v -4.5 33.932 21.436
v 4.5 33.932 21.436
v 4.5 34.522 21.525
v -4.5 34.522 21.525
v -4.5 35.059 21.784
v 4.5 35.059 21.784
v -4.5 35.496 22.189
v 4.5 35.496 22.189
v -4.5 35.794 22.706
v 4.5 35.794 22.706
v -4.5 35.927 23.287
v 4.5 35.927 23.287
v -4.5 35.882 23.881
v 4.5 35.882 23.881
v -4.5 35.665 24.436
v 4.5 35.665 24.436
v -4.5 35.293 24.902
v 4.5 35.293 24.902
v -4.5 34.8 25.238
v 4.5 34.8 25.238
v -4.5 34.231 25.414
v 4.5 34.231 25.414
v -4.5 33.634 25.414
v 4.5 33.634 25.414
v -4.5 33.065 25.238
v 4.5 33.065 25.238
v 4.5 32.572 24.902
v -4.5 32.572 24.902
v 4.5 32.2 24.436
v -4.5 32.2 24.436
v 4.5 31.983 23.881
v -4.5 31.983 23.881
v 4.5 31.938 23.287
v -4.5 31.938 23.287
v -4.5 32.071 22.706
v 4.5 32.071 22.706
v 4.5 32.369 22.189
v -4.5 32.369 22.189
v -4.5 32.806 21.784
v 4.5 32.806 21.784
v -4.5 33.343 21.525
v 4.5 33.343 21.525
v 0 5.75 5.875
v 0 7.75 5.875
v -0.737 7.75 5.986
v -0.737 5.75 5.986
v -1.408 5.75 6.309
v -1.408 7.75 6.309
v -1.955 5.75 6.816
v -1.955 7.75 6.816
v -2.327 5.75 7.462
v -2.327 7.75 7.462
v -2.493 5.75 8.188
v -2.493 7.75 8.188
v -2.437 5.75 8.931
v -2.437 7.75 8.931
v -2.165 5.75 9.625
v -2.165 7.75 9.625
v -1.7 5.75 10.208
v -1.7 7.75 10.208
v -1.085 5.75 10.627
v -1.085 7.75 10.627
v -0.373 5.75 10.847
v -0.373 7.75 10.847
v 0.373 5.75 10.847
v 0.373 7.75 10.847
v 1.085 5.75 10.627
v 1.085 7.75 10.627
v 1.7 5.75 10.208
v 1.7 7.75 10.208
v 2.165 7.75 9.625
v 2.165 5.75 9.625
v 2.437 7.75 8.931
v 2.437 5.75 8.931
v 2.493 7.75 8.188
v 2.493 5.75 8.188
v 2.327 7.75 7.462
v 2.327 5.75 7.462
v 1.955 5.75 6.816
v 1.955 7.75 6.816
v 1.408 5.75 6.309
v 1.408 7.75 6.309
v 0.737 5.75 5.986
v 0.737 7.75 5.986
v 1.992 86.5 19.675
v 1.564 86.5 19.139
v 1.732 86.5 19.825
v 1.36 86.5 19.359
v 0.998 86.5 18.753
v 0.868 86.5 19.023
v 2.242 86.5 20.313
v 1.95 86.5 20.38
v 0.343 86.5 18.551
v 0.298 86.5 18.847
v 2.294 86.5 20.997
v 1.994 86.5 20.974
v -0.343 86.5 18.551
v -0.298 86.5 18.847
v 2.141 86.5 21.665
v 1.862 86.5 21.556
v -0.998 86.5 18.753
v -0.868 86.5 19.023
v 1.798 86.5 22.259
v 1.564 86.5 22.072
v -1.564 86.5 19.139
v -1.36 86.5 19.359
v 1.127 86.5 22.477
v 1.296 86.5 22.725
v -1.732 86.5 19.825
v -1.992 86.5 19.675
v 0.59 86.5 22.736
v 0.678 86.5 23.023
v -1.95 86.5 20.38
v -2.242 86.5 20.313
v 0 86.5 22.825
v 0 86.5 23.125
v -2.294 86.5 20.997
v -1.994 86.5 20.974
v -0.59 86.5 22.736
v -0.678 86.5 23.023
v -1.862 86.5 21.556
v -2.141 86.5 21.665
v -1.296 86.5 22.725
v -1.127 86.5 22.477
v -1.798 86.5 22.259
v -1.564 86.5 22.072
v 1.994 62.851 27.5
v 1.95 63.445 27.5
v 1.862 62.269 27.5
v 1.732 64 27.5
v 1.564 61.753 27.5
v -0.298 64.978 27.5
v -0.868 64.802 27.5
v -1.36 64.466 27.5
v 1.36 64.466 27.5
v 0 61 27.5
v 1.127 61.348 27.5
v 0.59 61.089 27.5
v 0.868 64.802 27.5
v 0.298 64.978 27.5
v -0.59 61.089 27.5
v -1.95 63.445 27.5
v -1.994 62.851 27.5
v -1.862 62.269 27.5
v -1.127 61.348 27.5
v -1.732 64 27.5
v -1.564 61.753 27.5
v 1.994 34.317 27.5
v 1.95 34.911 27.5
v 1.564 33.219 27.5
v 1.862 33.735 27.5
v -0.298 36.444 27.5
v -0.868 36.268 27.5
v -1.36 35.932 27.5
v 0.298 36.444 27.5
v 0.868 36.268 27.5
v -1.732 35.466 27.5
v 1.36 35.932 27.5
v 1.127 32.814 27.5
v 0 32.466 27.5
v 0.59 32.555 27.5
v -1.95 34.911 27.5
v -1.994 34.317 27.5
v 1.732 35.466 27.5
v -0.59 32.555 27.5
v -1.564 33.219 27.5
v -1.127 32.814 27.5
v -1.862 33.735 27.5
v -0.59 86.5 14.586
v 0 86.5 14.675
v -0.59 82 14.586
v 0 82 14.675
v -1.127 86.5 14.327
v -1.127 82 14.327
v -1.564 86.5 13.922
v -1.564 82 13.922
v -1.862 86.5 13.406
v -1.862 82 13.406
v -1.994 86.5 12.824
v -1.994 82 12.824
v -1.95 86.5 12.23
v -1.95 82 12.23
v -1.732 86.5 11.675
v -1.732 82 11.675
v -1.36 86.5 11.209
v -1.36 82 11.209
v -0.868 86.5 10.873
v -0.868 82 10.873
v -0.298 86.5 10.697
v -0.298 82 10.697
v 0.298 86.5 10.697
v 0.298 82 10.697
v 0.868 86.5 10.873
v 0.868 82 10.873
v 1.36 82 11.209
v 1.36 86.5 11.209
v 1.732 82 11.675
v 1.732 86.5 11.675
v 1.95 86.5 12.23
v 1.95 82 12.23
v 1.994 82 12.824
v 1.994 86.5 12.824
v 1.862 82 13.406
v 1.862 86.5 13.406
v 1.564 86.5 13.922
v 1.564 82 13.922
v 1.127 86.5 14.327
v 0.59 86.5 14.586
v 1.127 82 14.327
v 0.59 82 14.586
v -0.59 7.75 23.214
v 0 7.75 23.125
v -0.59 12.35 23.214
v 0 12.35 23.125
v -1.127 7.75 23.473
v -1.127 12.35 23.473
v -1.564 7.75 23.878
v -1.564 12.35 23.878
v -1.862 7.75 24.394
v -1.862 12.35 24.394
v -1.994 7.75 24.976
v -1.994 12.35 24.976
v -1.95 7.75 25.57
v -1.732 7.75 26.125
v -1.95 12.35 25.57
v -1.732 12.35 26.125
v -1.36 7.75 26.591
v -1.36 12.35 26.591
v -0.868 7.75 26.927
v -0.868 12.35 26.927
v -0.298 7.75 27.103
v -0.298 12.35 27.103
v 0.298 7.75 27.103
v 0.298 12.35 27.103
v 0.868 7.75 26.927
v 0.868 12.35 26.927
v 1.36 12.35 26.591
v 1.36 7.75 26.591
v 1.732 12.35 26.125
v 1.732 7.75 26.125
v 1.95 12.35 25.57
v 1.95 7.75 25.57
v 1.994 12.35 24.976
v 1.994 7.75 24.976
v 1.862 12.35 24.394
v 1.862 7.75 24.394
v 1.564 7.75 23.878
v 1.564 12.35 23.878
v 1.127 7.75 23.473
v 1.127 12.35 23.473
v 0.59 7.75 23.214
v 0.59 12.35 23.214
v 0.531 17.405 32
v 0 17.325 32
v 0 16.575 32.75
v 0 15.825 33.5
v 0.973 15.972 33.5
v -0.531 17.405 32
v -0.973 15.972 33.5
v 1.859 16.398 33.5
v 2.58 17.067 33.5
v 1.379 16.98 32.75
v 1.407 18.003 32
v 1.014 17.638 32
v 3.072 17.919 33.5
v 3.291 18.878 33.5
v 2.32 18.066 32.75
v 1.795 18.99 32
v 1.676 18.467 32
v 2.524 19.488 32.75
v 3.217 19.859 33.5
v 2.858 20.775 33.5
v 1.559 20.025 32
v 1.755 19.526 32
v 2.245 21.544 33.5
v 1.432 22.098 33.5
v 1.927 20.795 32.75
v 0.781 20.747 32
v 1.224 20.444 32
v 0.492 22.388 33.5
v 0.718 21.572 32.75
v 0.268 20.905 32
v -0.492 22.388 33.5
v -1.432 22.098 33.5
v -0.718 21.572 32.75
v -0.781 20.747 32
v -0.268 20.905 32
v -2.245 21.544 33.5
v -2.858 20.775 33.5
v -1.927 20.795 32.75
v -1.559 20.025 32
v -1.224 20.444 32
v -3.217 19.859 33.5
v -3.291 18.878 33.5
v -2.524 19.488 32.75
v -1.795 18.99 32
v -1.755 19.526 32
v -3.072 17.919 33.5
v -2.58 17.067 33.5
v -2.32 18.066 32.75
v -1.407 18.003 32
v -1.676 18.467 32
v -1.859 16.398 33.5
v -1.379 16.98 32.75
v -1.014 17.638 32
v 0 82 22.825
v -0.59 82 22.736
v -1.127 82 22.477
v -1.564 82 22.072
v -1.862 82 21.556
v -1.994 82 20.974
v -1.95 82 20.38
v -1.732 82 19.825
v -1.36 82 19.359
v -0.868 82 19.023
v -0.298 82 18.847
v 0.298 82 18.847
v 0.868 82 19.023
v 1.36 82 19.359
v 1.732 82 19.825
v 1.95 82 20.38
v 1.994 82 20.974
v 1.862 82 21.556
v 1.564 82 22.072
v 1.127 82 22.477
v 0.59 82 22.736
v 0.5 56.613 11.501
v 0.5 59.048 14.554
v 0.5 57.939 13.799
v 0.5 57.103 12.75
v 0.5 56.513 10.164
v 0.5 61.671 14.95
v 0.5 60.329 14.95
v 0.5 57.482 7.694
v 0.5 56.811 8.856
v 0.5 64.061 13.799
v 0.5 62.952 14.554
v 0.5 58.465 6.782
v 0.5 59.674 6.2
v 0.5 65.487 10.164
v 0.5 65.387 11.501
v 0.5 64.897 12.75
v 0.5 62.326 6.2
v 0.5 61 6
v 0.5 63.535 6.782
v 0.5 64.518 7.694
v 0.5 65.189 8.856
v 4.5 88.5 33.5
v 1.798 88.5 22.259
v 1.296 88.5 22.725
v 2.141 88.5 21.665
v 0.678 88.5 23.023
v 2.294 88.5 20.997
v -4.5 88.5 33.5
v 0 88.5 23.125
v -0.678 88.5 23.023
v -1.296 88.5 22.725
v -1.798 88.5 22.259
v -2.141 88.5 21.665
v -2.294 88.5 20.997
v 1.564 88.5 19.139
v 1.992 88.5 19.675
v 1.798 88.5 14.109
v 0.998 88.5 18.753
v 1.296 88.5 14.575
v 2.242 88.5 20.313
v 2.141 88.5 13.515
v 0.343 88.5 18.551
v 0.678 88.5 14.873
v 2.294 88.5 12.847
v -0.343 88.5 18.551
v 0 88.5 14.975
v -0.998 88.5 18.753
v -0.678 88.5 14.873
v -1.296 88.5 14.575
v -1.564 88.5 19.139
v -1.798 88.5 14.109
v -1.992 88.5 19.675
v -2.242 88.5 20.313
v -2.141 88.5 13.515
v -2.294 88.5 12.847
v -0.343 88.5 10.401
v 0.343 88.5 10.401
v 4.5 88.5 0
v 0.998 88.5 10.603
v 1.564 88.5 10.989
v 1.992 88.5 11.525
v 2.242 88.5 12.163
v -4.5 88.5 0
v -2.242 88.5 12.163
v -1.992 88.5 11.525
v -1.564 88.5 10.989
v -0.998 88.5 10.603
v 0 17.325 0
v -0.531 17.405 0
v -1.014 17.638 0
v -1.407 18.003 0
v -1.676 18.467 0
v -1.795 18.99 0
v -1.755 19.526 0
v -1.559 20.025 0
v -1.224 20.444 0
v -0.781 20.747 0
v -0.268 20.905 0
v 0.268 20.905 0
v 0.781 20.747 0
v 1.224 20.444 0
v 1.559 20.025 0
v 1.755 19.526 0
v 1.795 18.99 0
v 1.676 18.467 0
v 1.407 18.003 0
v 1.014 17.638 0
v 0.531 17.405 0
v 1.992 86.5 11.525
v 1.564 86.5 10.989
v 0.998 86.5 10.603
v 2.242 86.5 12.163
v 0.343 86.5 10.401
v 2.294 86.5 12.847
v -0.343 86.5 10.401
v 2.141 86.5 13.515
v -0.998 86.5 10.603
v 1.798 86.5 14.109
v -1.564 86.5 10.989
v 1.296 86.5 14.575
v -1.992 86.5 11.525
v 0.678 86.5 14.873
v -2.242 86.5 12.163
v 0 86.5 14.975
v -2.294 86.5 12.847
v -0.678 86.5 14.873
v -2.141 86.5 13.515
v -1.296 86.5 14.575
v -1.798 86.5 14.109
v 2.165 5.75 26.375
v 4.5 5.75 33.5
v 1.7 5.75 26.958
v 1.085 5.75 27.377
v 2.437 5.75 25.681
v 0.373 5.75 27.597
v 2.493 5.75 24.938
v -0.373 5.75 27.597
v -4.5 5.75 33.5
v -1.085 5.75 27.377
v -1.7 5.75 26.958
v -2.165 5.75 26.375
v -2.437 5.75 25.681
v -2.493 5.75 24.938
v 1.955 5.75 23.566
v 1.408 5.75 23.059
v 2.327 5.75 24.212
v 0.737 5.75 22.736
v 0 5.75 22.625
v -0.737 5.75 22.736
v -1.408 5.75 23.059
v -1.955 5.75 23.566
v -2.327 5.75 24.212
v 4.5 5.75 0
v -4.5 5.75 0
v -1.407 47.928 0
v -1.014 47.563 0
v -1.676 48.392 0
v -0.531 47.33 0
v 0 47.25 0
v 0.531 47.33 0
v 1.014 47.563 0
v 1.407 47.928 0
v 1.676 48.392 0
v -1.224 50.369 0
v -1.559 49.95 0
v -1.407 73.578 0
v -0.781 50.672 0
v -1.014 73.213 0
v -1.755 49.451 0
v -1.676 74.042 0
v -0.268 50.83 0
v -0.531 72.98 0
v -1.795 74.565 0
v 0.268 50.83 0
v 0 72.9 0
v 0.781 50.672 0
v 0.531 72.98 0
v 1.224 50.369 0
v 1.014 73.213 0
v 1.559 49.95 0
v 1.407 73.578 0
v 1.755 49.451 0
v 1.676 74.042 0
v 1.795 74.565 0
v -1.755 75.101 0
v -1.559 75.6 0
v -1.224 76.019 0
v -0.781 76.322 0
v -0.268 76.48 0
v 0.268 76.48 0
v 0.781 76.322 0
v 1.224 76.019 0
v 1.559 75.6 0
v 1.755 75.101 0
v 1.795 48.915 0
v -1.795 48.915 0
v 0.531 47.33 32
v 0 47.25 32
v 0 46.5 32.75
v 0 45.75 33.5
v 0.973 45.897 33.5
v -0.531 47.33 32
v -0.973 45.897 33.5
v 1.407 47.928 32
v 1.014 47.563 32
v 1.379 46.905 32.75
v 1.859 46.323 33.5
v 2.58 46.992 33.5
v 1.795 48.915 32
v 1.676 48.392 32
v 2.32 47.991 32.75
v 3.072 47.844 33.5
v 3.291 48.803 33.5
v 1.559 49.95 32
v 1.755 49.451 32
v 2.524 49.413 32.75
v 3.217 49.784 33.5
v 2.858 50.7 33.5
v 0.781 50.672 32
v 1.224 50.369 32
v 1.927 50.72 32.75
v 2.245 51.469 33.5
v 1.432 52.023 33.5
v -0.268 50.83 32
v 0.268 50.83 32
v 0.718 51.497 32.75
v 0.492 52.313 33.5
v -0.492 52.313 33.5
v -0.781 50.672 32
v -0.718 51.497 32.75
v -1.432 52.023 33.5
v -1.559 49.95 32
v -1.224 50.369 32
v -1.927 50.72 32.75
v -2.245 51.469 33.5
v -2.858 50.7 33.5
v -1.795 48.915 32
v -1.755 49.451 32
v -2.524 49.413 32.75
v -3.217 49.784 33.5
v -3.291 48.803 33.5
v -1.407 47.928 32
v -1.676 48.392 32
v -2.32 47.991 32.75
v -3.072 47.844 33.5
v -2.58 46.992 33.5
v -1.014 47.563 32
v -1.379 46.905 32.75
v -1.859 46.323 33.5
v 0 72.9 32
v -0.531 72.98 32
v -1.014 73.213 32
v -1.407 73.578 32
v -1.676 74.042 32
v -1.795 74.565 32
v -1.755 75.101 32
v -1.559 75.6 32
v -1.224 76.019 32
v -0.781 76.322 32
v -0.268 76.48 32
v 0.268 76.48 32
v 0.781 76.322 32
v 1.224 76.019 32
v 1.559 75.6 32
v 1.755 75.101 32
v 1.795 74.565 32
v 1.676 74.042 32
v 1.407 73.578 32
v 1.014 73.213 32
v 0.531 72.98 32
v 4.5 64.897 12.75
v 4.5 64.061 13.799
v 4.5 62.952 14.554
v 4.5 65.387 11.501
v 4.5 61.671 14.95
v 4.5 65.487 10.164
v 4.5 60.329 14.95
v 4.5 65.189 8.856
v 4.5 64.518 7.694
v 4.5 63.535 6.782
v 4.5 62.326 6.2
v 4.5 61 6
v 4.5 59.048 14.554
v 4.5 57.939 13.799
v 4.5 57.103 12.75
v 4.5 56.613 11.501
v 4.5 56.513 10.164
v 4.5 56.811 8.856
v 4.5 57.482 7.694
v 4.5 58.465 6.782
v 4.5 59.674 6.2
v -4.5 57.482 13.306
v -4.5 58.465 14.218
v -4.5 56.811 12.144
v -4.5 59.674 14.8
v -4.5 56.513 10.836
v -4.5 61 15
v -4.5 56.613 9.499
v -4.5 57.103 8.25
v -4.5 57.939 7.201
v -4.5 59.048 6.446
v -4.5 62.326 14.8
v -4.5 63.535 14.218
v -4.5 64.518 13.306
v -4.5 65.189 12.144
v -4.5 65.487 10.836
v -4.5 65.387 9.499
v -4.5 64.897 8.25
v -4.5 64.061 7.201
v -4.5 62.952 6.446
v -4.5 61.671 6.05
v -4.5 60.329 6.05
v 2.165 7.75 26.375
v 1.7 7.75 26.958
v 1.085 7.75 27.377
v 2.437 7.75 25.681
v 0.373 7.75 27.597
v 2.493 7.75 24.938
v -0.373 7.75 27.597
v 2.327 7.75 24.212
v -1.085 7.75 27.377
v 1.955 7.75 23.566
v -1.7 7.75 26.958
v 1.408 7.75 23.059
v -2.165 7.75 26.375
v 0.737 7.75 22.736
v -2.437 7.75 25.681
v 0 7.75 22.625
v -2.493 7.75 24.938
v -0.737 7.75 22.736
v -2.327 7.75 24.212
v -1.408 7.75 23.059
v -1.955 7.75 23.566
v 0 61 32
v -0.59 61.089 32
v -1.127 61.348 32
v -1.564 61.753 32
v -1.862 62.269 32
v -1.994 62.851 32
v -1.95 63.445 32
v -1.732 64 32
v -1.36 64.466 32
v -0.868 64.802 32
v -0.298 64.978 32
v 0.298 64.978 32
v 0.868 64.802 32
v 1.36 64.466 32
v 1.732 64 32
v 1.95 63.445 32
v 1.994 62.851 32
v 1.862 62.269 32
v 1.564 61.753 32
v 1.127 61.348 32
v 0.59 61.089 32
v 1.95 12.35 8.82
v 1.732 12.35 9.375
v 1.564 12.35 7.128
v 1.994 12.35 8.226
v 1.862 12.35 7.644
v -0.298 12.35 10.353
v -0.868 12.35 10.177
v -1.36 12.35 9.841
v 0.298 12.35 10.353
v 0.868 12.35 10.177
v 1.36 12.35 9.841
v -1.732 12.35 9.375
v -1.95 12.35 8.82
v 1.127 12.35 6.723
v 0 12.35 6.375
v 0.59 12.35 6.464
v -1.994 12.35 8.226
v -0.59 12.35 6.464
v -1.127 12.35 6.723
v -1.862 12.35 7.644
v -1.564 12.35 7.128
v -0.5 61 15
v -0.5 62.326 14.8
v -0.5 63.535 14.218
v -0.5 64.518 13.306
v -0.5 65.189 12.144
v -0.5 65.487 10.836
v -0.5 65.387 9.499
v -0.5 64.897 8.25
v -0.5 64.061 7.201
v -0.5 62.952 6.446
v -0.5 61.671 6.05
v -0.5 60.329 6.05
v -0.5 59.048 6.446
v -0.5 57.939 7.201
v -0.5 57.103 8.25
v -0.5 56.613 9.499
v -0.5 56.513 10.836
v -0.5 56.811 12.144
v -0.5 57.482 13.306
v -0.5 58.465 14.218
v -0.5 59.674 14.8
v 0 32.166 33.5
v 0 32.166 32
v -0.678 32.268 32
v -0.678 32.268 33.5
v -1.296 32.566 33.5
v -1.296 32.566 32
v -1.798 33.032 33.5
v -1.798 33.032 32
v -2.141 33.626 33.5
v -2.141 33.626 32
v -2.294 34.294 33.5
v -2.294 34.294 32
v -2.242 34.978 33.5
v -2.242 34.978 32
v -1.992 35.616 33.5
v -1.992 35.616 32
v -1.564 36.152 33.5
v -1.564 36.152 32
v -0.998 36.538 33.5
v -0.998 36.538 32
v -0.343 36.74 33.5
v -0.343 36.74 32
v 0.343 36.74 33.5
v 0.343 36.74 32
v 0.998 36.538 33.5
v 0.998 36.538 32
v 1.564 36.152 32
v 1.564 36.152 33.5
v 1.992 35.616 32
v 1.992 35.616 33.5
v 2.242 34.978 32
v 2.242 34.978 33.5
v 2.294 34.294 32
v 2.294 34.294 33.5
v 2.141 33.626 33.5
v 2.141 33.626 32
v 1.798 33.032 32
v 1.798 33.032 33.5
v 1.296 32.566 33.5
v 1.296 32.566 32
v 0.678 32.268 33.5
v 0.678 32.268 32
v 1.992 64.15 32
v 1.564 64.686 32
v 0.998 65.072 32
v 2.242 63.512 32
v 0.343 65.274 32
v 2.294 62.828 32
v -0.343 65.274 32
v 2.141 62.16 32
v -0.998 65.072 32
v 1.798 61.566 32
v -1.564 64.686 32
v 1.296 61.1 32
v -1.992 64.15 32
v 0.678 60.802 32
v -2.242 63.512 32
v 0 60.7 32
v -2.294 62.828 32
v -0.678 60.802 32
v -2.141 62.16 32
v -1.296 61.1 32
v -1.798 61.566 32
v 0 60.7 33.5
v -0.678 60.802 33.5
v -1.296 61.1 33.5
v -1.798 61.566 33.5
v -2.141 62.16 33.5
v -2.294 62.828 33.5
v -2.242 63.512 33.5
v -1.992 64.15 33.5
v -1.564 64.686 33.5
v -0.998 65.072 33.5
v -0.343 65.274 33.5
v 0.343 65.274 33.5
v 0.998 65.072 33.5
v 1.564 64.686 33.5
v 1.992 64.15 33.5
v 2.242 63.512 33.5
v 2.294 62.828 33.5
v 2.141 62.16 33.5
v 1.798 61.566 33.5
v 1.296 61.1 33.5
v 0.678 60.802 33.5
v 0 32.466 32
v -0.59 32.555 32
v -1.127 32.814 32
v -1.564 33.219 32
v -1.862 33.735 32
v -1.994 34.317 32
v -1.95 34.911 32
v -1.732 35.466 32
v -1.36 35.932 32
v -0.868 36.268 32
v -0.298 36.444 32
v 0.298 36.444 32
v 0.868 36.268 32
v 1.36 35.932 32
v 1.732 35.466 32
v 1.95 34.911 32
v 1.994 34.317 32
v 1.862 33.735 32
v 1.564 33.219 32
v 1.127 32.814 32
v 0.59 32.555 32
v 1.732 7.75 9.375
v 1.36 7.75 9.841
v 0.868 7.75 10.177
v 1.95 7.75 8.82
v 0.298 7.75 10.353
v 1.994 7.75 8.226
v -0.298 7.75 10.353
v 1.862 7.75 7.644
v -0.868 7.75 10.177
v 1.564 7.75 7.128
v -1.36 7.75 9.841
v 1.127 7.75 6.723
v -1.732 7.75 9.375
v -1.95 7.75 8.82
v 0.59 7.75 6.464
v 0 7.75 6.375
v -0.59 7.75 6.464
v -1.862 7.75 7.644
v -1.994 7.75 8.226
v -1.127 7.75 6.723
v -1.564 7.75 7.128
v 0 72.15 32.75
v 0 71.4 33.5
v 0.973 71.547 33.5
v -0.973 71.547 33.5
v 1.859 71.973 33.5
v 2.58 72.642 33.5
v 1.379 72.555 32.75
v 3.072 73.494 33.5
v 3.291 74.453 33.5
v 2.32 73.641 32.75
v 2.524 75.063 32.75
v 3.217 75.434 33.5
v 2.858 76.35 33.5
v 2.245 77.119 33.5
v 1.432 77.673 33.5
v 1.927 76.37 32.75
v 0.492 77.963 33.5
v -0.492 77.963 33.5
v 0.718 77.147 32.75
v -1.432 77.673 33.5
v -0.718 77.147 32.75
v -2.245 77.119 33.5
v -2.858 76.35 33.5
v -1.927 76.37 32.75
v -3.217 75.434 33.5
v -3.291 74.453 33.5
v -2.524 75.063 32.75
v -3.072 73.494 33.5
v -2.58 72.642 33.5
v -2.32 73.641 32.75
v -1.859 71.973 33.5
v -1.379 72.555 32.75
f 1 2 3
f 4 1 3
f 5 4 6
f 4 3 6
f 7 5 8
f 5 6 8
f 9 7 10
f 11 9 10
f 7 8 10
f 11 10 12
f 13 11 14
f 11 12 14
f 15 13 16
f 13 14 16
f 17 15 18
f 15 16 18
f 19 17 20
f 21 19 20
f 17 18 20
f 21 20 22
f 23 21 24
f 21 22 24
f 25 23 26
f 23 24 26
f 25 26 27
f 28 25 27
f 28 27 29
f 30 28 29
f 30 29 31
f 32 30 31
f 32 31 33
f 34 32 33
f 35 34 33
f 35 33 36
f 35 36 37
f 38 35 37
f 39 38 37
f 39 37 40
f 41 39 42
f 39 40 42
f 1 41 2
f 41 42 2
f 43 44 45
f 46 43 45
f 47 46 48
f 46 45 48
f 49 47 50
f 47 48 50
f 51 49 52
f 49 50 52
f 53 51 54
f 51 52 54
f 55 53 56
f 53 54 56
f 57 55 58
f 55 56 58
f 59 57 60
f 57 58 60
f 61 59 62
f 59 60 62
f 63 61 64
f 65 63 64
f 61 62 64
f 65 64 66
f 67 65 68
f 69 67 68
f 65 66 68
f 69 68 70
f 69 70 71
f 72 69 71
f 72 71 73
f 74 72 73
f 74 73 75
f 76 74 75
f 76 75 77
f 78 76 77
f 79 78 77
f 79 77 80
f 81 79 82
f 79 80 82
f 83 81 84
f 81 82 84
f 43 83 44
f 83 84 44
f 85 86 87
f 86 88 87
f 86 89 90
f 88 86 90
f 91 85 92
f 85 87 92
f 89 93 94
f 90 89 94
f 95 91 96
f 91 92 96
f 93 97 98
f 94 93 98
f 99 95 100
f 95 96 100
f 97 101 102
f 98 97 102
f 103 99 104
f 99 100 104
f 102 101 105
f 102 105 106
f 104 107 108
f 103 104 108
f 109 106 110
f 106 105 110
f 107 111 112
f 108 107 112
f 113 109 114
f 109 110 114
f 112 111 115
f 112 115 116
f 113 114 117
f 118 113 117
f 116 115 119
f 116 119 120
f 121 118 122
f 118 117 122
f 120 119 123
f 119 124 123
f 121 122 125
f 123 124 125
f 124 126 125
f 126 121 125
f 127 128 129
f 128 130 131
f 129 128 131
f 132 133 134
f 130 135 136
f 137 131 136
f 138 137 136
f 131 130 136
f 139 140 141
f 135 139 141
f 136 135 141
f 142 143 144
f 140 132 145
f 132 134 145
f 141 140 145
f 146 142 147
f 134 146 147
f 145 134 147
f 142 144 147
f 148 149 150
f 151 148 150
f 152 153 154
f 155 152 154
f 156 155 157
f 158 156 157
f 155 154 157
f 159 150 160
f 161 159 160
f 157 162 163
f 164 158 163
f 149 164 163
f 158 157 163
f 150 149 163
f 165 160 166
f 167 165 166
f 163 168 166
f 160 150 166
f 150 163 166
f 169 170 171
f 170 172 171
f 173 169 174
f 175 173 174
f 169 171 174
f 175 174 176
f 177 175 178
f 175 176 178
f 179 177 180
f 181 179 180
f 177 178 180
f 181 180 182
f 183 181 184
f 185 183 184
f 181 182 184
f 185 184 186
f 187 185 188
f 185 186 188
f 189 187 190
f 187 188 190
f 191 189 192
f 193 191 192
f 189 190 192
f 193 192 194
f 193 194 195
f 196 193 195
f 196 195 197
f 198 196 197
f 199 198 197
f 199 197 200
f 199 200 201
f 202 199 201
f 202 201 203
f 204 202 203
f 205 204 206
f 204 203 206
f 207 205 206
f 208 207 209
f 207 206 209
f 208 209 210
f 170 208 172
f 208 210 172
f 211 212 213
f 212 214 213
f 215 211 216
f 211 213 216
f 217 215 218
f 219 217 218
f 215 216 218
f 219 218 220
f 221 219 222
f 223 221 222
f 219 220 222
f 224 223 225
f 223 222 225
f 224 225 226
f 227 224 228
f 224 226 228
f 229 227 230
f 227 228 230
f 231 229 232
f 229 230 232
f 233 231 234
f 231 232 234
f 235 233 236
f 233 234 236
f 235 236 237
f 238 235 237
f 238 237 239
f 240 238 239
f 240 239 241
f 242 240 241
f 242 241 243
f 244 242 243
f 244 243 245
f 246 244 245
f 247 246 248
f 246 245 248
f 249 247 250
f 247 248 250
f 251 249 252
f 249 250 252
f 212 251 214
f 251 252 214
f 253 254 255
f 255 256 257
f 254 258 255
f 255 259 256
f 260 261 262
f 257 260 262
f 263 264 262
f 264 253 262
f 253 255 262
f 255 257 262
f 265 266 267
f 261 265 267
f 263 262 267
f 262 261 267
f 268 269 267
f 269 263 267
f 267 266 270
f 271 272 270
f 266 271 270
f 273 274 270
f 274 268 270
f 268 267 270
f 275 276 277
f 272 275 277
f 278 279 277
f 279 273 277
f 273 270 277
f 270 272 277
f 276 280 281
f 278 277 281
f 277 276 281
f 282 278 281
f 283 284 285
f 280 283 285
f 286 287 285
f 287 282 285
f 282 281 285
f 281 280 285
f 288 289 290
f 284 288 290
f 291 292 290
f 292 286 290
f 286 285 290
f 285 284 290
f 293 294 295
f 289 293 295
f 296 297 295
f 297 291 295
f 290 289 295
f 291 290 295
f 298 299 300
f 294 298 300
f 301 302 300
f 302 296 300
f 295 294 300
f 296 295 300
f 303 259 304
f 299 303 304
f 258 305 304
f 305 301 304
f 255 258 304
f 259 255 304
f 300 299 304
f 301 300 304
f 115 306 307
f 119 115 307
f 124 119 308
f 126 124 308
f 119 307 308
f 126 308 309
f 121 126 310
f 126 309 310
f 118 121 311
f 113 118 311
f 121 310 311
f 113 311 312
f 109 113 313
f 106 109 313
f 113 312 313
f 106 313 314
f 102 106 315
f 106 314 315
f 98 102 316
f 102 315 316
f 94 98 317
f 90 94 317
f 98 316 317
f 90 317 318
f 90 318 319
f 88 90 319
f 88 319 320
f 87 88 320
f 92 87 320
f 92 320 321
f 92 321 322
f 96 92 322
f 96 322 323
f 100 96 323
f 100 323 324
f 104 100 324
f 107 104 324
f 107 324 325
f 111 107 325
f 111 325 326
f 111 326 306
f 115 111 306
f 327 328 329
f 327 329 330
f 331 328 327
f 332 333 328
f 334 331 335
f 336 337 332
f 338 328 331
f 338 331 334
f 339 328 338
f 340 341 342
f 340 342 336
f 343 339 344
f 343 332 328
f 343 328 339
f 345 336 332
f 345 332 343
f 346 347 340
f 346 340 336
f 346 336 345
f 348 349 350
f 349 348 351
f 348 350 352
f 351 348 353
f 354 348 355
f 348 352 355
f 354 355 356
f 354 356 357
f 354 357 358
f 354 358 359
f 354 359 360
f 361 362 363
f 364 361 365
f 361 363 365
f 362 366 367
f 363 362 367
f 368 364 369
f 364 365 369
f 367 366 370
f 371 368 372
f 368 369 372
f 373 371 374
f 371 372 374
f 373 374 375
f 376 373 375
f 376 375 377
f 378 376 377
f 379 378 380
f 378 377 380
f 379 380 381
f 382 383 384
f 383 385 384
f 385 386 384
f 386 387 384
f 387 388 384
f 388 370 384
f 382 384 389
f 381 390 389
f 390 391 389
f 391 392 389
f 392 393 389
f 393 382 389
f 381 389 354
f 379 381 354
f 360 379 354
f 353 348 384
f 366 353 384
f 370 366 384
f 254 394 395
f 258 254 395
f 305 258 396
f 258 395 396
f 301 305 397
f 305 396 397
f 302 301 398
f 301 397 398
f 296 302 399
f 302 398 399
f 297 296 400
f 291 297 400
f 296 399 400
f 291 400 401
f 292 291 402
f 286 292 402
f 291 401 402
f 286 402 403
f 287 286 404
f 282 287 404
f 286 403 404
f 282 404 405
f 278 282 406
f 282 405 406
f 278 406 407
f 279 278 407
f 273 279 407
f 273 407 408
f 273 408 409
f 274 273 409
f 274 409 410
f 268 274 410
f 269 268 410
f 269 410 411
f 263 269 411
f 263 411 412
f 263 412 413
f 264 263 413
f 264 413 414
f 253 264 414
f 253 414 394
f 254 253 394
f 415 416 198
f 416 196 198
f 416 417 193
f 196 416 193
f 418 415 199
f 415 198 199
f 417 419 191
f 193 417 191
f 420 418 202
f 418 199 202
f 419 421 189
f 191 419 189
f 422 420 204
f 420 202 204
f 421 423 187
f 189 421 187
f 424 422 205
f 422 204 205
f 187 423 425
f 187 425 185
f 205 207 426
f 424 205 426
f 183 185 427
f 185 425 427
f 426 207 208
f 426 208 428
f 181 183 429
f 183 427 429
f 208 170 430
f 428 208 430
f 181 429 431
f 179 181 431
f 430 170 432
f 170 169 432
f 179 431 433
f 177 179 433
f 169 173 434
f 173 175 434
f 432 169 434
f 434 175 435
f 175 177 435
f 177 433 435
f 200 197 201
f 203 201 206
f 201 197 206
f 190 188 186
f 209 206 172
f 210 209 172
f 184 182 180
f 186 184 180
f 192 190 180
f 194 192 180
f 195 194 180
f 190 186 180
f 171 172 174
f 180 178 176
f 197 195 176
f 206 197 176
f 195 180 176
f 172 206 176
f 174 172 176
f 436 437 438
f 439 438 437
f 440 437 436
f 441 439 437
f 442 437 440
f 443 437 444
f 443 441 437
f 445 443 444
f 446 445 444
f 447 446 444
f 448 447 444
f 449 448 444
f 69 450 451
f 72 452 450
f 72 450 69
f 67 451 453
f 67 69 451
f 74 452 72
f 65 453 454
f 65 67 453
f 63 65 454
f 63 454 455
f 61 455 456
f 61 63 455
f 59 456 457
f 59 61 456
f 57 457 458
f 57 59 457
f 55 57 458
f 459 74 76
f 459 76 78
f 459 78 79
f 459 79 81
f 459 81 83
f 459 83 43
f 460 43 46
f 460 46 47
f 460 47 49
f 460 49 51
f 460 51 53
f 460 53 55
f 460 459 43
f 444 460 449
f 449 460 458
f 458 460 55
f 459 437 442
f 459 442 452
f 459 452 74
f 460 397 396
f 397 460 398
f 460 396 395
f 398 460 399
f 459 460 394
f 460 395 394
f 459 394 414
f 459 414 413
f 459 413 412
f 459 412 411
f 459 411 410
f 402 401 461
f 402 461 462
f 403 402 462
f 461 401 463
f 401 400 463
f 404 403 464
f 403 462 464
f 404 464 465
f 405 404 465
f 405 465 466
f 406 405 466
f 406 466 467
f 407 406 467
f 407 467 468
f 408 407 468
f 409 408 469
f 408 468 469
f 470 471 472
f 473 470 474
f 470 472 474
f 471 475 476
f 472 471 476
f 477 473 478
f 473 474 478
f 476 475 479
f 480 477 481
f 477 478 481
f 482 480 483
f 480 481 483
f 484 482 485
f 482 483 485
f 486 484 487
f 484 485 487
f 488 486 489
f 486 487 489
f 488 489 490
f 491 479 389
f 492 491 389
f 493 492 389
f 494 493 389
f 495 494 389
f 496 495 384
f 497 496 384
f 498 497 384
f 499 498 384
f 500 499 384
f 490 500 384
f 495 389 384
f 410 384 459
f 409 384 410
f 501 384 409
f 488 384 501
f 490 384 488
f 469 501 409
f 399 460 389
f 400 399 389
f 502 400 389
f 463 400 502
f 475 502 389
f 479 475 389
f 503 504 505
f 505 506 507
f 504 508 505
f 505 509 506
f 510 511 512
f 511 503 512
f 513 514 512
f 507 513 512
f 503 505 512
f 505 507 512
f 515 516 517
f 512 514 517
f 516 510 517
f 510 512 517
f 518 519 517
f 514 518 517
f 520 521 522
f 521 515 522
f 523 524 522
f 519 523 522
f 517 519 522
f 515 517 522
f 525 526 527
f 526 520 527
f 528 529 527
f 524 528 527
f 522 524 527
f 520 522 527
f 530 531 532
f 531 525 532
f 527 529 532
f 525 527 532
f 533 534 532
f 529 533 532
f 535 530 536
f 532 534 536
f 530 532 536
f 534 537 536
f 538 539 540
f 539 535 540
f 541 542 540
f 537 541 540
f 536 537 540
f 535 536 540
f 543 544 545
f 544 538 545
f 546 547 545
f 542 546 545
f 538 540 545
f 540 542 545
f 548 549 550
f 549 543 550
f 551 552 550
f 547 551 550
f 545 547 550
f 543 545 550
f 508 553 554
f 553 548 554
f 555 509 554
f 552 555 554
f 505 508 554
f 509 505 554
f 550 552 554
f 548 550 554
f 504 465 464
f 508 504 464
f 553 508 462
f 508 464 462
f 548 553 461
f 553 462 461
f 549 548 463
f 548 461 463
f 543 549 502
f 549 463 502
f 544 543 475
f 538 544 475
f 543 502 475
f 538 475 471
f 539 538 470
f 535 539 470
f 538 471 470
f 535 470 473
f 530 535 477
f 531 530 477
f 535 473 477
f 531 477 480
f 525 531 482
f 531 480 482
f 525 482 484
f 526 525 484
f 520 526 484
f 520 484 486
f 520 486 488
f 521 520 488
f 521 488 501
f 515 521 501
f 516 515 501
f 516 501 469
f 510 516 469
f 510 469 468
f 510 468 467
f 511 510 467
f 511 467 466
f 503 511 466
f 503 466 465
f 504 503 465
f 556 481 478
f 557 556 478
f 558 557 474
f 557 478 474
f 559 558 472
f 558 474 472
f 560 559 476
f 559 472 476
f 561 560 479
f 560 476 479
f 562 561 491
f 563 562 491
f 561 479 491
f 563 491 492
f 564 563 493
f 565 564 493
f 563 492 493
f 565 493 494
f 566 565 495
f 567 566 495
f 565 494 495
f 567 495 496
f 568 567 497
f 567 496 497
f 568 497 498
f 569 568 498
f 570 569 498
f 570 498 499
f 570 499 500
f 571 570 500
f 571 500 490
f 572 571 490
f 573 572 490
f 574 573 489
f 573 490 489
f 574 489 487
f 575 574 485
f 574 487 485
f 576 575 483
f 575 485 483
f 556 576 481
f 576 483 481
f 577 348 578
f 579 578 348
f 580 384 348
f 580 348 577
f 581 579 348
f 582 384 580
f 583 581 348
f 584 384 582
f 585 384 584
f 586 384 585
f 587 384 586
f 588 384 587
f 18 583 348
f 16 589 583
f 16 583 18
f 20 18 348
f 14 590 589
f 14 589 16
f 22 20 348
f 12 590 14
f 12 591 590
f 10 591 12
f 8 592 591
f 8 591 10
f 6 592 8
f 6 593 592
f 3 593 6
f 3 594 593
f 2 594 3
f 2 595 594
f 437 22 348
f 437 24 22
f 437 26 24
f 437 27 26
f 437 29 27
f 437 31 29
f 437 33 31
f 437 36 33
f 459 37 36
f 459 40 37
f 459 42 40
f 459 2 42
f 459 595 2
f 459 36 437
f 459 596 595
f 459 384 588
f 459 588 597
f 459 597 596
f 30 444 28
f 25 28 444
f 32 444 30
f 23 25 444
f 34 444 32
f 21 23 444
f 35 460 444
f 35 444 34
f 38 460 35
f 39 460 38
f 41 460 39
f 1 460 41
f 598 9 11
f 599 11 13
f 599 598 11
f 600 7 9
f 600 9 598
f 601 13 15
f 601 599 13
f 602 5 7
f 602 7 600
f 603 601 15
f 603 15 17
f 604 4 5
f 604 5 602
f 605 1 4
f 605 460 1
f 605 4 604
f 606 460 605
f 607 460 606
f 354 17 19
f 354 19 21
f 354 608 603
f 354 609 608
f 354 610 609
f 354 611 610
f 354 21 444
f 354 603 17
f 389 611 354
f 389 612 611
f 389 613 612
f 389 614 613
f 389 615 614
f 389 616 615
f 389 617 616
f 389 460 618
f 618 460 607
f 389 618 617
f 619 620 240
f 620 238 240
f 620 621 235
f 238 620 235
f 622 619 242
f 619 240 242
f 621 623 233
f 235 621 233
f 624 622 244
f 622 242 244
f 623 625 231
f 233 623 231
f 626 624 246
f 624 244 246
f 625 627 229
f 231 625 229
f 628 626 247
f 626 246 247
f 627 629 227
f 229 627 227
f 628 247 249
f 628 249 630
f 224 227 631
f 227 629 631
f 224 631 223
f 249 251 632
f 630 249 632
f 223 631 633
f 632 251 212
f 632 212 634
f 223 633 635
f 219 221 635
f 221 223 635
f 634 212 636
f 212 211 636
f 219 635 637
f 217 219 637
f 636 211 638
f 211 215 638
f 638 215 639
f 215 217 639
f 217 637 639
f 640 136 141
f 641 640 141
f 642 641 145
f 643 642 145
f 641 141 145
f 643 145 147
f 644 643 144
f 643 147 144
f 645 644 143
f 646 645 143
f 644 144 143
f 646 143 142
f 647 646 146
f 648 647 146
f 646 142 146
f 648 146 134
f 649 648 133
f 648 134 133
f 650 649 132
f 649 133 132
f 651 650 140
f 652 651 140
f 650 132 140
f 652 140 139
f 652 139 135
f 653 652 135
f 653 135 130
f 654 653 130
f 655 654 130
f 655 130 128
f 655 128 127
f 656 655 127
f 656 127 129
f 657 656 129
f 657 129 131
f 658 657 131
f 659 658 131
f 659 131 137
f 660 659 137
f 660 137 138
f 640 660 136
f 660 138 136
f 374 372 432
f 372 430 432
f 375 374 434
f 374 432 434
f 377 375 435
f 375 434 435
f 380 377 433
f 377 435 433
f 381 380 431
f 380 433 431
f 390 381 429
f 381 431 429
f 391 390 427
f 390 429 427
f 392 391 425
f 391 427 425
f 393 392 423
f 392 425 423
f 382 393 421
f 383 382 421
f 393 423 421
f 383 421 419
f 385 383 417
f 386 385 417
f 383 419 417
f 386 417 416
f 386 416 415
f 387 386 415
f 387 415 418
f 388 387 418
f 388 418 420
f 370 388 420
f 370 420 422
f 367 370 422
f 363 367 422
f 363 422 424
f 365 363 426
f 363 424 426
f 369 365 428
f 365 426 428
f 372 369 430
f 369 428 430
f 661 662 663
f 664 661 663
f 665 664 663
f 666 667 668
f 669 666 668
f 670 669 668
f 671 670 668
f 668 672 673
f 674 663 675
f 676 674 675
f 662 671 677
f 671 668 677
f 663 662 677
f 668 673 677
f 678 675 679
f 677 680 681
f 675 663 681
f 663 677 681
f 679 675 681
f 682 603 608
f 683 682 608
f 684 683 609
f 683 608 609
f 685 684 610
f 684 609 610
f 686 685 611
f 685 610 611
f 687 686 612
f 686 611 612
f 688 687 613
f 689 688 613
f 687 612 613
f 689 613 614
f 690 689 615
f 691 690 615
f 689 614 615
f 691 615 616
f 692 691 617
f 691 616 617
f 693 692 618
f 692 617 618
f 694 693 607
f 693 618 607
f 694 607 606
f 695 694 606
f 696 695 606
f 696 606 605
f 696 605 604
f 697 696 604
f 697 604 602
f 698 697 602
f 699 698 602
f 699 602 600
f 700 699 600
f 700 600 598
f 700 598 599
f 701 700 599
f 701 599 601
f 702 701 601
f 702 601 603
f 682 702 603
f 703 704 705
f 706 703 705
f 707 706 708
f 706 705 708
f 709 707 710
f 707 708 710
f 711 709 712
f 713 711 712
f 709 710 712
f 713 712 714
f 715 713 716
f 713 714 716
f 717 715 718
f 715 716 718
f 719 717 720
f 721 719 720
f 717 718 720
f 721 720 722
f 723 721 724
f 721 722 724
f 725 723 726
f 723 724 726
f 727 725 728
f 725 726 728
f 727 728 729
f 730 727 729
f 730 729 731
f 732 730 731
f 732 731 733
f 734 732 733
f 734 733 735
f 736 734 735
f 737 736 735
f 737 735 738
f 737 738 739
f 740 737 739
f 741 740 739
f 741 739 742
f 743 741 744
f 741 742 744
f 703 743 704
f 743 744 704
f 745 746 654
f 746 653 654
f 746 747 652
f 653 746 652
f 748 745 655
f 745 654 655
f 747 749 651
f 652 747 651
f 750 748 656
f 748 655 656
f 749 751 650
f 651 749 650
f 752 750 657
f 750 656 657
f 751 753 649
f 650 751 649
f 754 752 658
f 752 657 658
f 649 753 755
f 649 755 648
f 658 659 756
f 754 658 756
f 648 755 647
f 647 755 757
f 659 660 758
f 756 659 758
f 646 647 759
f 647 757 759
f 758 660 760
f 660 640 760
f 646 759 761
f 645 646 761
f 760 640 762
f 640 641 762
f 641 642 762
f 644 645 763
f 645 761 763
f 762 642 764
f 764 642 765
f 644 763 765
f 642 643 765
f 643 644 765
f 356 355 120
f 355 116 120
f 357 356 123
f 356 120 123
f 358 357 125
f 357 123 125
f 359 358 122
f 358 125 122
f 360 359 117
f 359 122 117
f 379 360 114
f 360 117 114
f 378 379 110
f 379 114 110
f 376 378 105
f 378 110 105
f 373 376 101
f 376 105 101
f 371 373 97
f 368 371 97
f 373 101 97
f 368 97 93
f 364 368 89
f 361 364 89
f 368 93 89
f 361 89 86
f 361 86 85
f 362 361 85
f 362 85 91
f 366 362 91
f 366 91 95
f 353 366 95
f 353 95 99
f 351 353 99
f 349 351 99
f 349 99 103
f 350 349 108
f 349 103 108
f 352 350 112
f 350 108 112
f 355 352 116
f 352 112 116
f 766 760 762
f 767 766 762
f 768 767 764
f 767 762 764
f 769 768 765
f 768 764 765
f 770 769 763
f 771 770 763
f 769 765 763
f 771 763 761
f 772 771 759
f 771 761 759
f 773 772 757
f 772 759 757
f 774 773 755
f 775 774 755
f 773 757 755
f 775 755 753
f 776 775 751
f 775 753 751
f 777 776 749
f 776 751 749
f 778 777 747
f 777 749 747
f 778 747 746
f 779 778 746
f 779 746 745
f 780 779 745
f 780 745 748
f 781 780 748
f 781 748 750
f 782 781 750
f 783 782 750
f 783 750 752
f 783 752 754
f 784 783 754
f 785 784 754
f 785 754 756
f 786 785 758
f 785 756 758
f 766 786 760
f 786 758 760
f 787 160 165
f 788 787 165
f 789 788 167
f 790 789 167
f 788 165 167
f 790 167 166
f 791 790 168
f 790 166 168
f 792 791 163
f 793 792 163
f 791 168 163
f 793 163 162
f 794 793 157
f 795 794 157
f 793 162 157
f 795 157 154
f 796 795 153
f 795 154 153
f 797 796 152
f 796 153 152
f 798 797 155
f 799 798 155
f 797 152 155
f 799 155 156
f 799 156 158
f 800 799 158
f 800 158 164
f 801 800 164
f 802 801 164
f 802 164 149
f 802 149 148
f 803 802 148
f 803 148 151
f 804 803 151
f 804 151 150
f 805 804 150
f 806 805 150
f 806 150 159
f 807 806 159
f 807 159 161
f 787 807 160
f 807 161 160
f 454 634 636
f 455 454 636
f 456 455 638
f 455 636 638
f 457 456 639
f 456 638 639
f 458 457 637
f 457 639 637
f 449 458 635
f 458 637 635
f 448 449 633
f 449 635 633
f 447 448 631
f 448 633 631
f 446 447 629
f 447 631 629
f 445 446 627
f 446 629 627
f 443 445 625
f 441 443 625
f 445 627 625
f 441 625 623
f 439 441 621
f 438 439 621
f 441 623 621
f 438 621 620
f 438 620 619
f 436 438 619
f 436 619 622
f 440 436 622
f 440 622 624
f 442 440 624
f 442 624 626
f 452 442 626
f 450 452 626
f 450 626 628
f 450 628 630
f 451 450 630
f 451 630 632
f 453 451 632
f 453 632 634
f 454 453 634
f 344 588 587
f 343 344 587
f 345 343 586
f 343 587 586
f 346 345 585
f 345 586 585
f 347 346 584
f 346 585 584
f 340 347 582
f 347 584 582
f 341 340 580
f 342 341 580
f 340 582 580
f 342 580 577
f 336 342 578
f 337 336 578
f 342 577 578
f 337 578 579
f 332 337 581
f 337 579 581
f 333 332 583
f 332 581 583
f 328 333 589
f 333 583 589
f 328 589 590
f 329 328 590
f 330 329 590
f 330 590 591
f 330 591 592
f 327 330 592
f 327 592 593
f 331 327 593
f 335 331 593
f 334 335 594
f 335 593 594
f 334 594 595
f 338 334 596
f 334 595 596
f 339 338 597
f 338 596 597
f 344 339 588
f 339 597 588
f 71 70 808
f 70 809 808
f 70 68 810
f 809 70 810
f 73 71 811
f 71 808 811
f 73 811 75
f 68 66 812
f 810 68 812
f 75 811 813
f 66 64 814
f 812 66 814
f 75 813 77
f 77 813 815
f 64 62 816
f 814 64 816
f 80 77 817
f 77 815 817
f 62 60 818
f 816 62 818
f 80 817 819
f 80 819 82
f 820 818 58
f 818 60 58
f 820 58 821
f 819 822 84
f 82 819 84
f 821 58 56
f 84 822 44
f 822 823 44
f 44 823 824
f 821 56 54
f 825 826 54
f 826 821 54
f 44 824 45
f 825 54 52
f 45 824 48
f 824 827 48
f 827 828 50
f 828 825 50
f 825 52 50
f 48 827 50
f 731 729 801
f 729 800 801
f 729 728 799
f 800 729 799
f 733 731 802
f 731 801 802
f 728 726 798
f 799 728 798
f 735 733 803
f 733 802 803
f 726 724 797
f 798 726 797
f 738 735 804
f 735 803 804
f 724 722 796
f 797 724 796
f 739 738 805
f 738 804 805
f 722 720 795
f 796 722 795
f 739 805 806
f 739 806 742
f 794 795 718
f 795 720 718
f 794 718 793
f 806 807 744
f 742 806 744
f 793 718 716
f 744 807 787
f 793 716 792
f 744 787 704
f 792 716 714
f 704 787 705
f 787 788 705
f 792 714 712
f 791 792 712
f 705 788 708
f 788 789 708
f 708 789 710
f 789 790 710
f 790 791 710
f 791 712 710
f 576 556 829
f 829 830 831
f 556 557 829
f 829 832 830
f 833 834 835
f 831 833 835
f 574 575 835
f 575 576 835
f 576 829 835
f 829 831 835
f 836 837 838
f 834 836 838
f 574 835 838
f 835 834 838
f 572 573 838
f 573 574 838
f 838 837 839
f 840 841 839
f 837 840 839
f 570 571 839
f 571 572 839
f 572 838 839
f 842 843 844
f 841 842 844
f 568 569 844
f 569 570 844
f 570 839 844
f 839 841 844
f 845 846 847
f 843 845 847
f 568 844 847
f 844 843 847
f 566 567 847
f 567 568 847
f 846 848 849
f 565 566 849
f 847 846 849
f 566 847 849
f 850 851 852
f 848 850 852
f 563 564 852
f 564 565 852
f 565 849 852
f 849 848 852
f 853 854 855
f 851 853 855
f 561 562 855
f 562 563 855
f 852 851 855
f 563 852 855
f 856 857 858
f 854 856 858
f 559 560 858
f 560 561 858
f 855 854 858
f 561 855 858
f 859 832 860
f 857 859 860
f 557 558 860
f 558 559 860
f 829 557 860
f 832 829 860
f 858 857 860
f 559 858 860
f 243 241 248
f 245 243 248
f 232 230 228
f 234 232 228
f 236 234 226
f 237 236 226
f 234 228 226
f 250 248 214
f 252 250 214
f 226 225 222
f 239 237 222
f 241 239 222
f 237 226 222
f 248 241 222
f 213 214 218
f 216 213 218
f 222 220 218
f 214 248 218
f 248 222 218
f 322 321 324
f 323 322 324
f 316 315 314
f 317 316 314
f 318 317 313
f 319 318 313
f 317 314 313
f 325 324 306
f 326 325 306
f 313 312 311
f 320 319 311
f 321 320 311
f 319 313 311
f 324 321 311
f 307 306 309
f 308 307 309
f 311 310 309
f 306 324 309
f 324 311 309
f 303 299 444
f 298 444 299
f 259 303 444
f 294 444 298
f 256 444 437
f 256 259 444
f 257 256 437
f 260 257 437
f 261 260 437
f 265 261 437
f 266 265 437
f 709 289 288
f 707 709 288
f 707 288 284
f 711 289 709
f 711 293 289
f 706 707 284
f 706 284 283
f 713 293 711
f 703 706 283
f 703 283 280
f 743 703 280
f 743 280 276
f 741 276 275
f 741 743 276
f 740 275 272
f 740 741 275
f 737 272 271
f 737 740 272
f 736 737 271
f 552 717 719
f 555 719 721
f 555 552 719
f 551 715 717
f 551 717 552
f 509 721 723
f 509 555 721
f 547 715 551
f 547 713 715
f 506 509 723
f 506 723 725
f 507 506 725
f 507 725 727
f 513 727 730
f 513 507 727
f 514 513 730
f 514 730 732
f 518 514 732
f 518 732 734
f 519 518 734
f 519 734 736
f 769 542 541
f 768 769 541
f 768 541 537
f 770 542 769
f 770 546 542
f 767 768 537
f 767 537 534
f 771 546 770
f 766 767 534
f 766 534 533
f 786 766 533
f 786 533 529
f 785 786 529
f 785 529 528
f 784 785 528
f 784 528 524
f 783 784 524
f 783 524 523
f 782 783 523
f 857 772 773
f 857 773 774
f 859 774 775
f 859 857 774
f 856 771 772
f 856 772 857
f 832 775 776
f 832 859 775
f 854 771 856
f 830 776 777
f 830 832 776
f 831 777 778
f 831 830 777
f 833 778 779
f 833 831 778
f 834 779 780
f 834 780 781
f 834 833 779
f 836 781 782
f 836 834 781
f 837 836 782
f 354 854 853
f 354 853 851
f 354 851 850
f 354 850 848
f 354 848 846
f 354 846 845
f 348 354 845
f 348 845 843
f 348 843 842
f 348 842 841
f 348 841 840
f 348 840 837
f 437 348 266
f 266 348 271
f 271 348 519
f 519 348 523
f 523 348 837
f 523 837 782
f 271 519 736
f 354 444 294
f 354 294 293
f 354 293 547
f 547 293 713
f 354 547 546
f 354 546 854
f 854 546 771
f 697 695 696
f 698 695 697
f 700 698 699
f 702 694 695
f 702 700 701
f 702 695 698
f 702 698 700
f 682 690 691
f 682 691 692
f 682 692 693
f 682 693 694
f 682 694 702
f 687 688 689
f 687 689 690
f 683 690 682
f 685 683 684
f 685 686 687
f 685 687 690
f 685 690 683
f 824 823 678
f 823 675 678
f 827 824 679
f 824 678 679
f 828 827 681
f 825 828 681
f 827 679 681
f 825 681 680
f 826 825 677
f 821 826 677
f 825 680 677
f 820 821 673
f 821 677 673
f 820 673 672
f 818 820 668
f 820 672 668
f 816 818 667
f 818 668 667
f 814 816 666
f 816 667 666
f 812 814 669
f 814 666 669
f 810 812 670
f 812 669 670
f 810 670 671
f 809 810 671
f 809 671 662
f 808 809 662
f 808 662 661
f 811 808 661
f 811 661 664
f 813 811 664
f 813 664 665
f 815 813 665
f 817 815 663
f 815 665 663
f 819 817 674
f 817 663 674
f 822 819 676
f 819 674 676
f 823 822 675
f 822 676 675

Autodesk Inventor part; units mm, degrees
ref_plane "YZ Plane" through (0, 0, 0) normal (1, 0, 0) x (0, 1, 0)
ref_plane "XZ Plane" through (0, 0, 0) normal (0, 1, 0) x (-1, 0, 0)
ref_plane "Work Plane1" through (0, 0, 0) normal (0, 0, 1) x (1, 0, 0)
ref_plane "Work Plane2" through (-89, -40.3889, 33.5) normal (0, 0, 1) x (1, 0, 0)
sketch "Sketch1" plane through (0, 0, 0) normal (0, 0, 1) x (1, 0, 0)
  line L0 (23.5, 88.5) -> (-23.5, 88.5) projected
  line L1 (-23.5, 88.5) -> (-23.5, 36.5) projected
  line L2 (-26.5, 33.5) -> (-89, 33.5) projected
  line L3 (-89, 33.5) -> (-89, -72.5) projected
  line L4 (-89, -72.5) -> (-77, -72.5) projected
  line L5 (-74, -75.5) -> (-74, -93.5) projected
  line L6 (-74, -93.5) -> (74, -93.5) projected
  line L7 (74, -93.5) -> (74, -75.5) projected
  line L8 (77, -72.5) -> (89, -72.5) projected
  line L9 (89, -72.5) -> (89, 33.5) projected
  line L10 (89, 33.5) -> (26.5, 33.5) projected
  line L11 (23.5, 36.5) -> (23.5, 88.5) projected
  line L12 (-4.5, 81.5) -> (-4.5, 36.5) projected
  line L13 (-7.5, 33.5) -> (-13.5, 33.5) projected
  line L14 (-16.5, 36.5) -> (-16.5, 81.5) projected
  line L15 (7.5, 84.5) -> (13.5, 84.5) projected
  line L16 (16.5, 81.5) -> (16.5, 36.5) projected
  line L17 (13.5, 33.5) -> (7.5, 33.5) projected
  line L18 (4.5, 36.5) -> (4.5, 81.5) projected
  line L19 (-13.5, 84.5) -> (-7.5, 84.5) projected
  line L20 (-4.5, 88.5) -> (4.5, 88.5)
  line L21 (4.5, 88.5) -> (4.5, 5.75)
  line L22 (4.5, 5.75) -> (-4.5, 5.75)
  line L23 (-4.5, 5.75) -> (-4.5, 88.5)
  line L24 (-32.2, 4.75) -> (-59.9, 4.75)
  arc A0 (13.5, 33.5) -> (16.5, 36.5) centre (13.5, 36.5) ccw projected
  arc A1 (4.5, 36.5) -> (7.5, 33.5) centre (7.5, 36.5) ccw projected
  arc A2 (7.5, 84.5) -> (4.5, 81.5) centre (7.5, 81.5) ccw projected
  arc A3 (16.5, 81.5) -> (13.5, 84.5) centre (13.5, 81.5) ccw projected
  arc A4 (-4.5, 81.5) -> (-7.5, 84.5) centre (-7.5, 81.5) ccw projected
  arc A5 (-7.5, 33.5) -> (-4.5, 36.5) centre (-7.5, 36.5) ccw projected
  arc A6 (-16.5, 36.5) -> (-13.5, 33.5) centre (-13.5, 36.5) ccw projected
  arc A7 (-13.5, 84.5) -> (-16.5, 81.5) centre (-13.5, 81.5) ccw projected
  arc A8 (-26.5, 33.5) -> (-23.5, 36.5) centre (-26.5, 36.5) ccw projected
  arc A9 (-74, -75.5) -> (-77, -72.5) centre (-77, -75.5) ccw projected
  arc A10 (77, -72.5) -> (74, -75.5) centre (77, -75.5) ccw projected
  arc A11 (23.5, 36.5) -> (26.5, 33.5) centre (26.5, 36.5) ccw projected
  circle A12 centre (21.5, -85.5) radius 1.8 projected
  circle A13 centre (-64.5, -85.5) radius 1.8 projected
  circle A14 centre (83.4, -16.3889) radius 1.8 projected
  circle A15 centre (-83.4, -19.2889) radius 1.8 projected
  circle A16 centre (-21.5, -85.5) radius 1.8 projected
  circle A17 centre (64.5, -85.5) radius 1.8 projected
  circle A18 centre (-56.0375, 15.0937) radius 1.0065 projected
  circle A19 centre (39.125, 4.3375) radius 1.0065 projected
  circle A20 centre (-72.95, 4.275) radius 1.0065 projected
  circle A21 centre (39.125, 25.9125) radius 1.0065 projected
  circle A22 centre (72.95, 12.275) radius 1.0065 projected
  circle A23 centre (86, 30.5) radius 1.0065 projected
  circle A24 centre (-86, 30.5) radius 1.0065 projected
  circle A25 centre (-39.125, 12.3375) radius 1.0065 projected
  circle A26 centre (-72.95, 25.975) radius 1.0065 projected
  circle A27 centre (-72.95, 12.275) radius 1.0065 projected
  circle A28 centre (-39.125, 25.9125) radius 1.0065 projected
  circle A29 centre (-86, 7.75) radius 1.0065 projected
  circle A30 centre (86, 7.75) radius 1.0065 projected
  circle A31 centre (72.95, 25.975) radius 1.0065 projected
  circle A32 centre (39.125, 12.3375) radius 1.0065 projected
  circle A33 centre (-39.125, 4.3375) radius 1.0065 projected
  circle A34 centre (72.95, 4.275) radius 1.0065 projected
  circle A35 centre (56.0375, 15.125) radius 1.0065 projected
  circle A36 centre (78, -67.1725) radius 1.2295 projected
  circle A37 centre (-24.1, -73.1) radius 1.2295 projected
  circle A38 centre (24.1, -24.9) radius 1.2295 projected
  circle A39 centre (-42.5, -43.2802) radius 1.2295 projected
  circle A40 centre (-79, -42.3889) radius 1.2295 projected
  circle A41 centre (-19.5, 28.875) radius 1.2295 projected
  circle A42 centre (19.5, 9.55) radius 1.2295 projected
  circle A43 centre (19.5, 47.3) radius 1.2295 projected
  circle A44 centre (-19.5, 47.3) radius 1.2295 projected
  circle A45 centre (0, 74.7) radius 1.2295 projected
  circle A46 centre (-19.4231, 74.8077) radius 1.2295 projected
  circle A47 centre (19.5, 74.7) radius 1.2295 projected
  circle A48 centre (0, 49.05) radius 1.2295 projected
  circle A49 centre (19.5, 28.875) radius 1.2295 projected
  circle A50 centre (0, 19.125) radius 1.2295 projected
  circle A51 centre (-19.5, 9.55) radius 1.2295 projected
  circle A52 centre (-78, -67.1725) radius 1.2295 projected
  circle A53 centre (-24.1, -24.9) radius 1.2295 projected
  circle A54 centre (24.1, -73.1) radius 1.2295 projected
  circle A55 centre (42.5, -42.7745) radius 1.2295 projected
  circle A56 centre (79, -42.3889) radius 1.2295 projected
  point P0 (0, 0)
  point P1 (-4.5, 81.5)
  point P2 (-4.5, 36.5)
  point P3 (7.5, 81.5)
  point P4 (13.5, 81.5)
  point P5 (-7.5, 81.5)
  point P6 (-13.5, 81.5)
  dimension "d41" = 1
extrude "Extrusion1" add sketch "Sketch1" along normal up to surface (33.5 mm away) contours L21 L18 L22 L23 L12 L0 | A45 | A48 | A50
sketch "Sketch2" plane through (4.5, 5.75, 0) normal (1, 0, 0) x (0, 0, -1)
  circle A0 centre (-23.4363, 28.1825) radius 2 projected
  point P0 (0, -5.75)
extrude "Extrusion2" cut sketch "Sketch2" against normal blind 10
sketch "Sketch3" plane through (4.5, 5.75, 0) normal (1, 0, 0) x (0, 0, -1)
  circle A0 centre (-10.5, 55.25) radius 4.5 projected
  point P0 (0, -5.75)
extrude "Extrusion3" cut sketch "Sketch3" against normal blind 4
sketch "Sketch4" plane through (-4.5, 5.75, 0) normal (-1, 0, 0) x (0, 0, 1)
  circle A0 centre (10.5, 55.25) radius 4.5 projected
  point P0 (0, -5.75)
extrude "Extrusion4" cut sketch "Sketch4" against normal blind 4
sketch "Sketch5" plane through (-4.5, 5.75, 33.5) normal (0, 0, 1) x (1, 0, 0)
  line L0 (5, 59.75) -> (5, 50.75) projected
  line L1 (4, 50.75) -> (4, 59.75) projected
  line L2 (9, 26.1825) -> (0, 26.1825) projected
  line L3 (9, 30.1825) -> (0, 30.1825) projected
  line L4 (17, 78.15) -> (-8, 78.15)
  line L5 (-8, 35.85) -> (17, 35.85)
  line L6 (9, 82.75) -> (9, 0) projected
  line L7 (0, 50.75) -> (0, 59.75) projected
  line L8 (9, 35.85) -> (0, 35.85)
  line L9 (0, 35.85) -> (0, 50.75)
  line L10 (0, 50.75) -> (9, 50.75)
  line L11 (9, 50.75) -> (9, 35.85)
  line L12 (0, 0) -> (0, 82.75) projected
  line L13 (9, 78.15) -> (0, 78.15)
  line L14 (0, 78.15) -> (0, 59.75)
  line L15 (0, 59.75) -> (9, 59.75)
  line L16 (9, 59.75) -> (9, 78.15)
  line L17 (-18, 6.625) -> (-18, 20.125) projected
  line L18 (-18, 13.375) -> (27, 13.375)
  line L19 (9, 35.85) -> (0, 50.75)
  line L20 (9, 59.75) -> (9, 50.75) projected
  line L21 (0, 35.85) -> (9, 50.75)
  line L22 (9, 59.75) -> (0, 78.15)
  line L23 (0, 59.75) -> (9, 78.15)
  point P0 (4.5, -5.75)
  point P1 (4.5, 13.375)
  point P2 (4.5, 43.3)
  point P3 (4.5, 68.95)
  dimension "d9" = 4.5
  dimension "d10" = 4.5
hole "Hole1" at (0, 19.125, 33.5) at (0, 49.05, 33.5) at (0, 74.7, 33.5) direction (0, 0, -1) diameter 3.6 end through all countersink diameter 6.6 countersink angle 90 clearance for "Countersunk Flat Head Screw ISO 2009/7046" size "M3" standard "ISO"
sketch "Sketch6" plane through (-4.5, 5.75, 0) normal (0, -1, 0) x (1, 0, 0)
  line L0 (9, 33.5) -> (0, 33.5) projected
  line L1 (0, 0) -> (0, 33.5) projected
  line L2 (0, 0) -> (9, 0) projected
  line L3 (9, 0) -> (9, 33.5) projected
  line L4 (0, 16.75) -> (9, 16.75)
  line L5 (9, 16.75) -> (0, 33.5)
  line L6 (9, 33.5) -> (0, 16.75)
  line L7 (0, 16.75) -> (9, 0)
  line L8 (9, 16.75) -> (0, 0)
  point P0 (4.5, 0)
  point P1 (4.5, 8.375)
  point P2 (4.5, 25.125)
hole "Hole2" at (0, 5.75, 8.375) at (0, 5.75, 25.125) direction (0, 1, 0) diameter 4 depth 6.6 counterbore diameter 5 counterbore depth 2
sketch "Sketch7" plane through (-4.5, 88.5, 0) normal (0, 1, 0) x (1, 0, 0)
  line L0 (0, -33.5) -> (9, -33.5) projected
  line L1 (0, -33.5) -> (9, -33.5) projected
  line L2 (9, 0) -> (9, -33.5) projected
  line L3 (9, 0) -> (0, 0) projected
  line L4 (0, 0) -> (0, -33.5) projected
  line L5 (-8, -1.4) -> (-8, -6.6) projected
  line L6 (-8, -32.1) -> (-8, -26.9) projected
  line L7 (17, -32.1) -> (17, -26.9) projected
  line L8 (17, -1.4) -> (17, -6.6) projected
  line L9 (17, -32.1) -> (-8, -32.1)
  line L10 (-8, -32.1) -> (-8, -26.9)
  line L11 (-8, -26.9) -> (17, -26.9)
  line L12 (17, -26.9) -> (17, -32.1)
  line L13 (-8, -6.6) -> (17, -6.6)
  line L14 (17, -6.6) -> (17, -1.4)
  line L15 (17, -1.4) -> (-8, -1.4)
  line L16 (-8, -1.4) -> (-8, -6.6)
  line L17 (17, -6.6) -> (-8, -6.6)
  line L18 (-8, -6.6) -> (-8, -8.6)
  line L19 (-8, -8.6) -> (17, -8.6)
  line L20 (17, -8.6) -> (17, -6.6)
  line L21 (-8, -26.9) -> (17, -26.9)
  line L22 (17, -26.9) -> (17, -24.9)
  line L23 (17, -24.9) -> (-8, -24.9)
  line L24 (-8, -24.9) -> (-8, -26.9)
  line L25 (9, 0) -> (9, -33.5) projected
  line L26 (9, -16.75) -> (0, -16.75)
  line L27 (0, 0) -> (0, -33.5) projected
  line L28 (9, -24.9) -> (0, -16.75)
  line L29 (9, -8.6) -> (0, -16.75)
  line L30 (0, -8.6) -> (9, -16.75)
  line L31 (9, -16.75) -> (0, -24.9)
  point P0 (4.5, 0)
  point P1 (4.5, -20.825)
  point P2 (4.5, -12.675)
  dimension "d25" = 2
  dimension "d26" = 2
hole "Hole3" at (0, 88.5, 20.825) at (0, 88.5, 12.675) direction (0, -1, 0) diameter 4 depth 6.5 counterbore diameter 4.6 counterbore depth 2
sketch "Sketch8" plane through (-4.5, 5.75, 33.5) normal (0, 0, 1) x (1, 0, 0)
  line L0 (26, 27.2497) -> (-17, 27.2497)
  line L1 (26, 31.2497) -> (-17, 31.2497)
  line L2 (4, 52.75) -> (-1, 52.75)
  line L3 (4, 61.75) -> (-1, 61.75)
  line L4 (10, 61.75) -> (5, 61.75)
  line L5 (9, 50.75) -> (5, 50.75) projected
  line L6 (0, 0) -> (0, 82.75) projected
  line L7 (9, 52.75) -> (0, 52.75)
  line L8 (0, 52.75) -> (0, 61.75)
  line L9 (0, 61.75) -> (9, 61.75)
  line L10 (9, 61.75) -> (9, 50.75)
  line L11 (9, 26.1825) -> (0, 26.1825) projected
  line L12 (0, 31.2497) -> (9, 31.2497)
  line L13 (9, 31.2497) -> (9, 26.1825)
  line L14 (9, 26.1825) -> (0, 26.1825)
  line L15 (0, 26.1825) -> (0, 31.2497)
  line L16 (9, 26.1825) -> (0, 31.2497)
  line L17 (0, 26.1825) -> (9, 31.2497)
  line L18 (10, 51.75) -> (0, 61.75)
  line L19 (0, 52.75) -> (9, 61.75)
  point P0 (4.5, -5.75)
  point P1 (4.5, 28.7161)
  point P2 (4.5, 57.25)
hole "Hole4" at (0, 34.4661, 33.5) at (0, 63, 33.5) direction (0, 0, -1) diameter 4 depth 6 counterbore diameter 4.6 counterbore depth 1.5
equation "\"d9\" = d10"
properties part number "middle_gear_holder" material "Nylon 6/6"
